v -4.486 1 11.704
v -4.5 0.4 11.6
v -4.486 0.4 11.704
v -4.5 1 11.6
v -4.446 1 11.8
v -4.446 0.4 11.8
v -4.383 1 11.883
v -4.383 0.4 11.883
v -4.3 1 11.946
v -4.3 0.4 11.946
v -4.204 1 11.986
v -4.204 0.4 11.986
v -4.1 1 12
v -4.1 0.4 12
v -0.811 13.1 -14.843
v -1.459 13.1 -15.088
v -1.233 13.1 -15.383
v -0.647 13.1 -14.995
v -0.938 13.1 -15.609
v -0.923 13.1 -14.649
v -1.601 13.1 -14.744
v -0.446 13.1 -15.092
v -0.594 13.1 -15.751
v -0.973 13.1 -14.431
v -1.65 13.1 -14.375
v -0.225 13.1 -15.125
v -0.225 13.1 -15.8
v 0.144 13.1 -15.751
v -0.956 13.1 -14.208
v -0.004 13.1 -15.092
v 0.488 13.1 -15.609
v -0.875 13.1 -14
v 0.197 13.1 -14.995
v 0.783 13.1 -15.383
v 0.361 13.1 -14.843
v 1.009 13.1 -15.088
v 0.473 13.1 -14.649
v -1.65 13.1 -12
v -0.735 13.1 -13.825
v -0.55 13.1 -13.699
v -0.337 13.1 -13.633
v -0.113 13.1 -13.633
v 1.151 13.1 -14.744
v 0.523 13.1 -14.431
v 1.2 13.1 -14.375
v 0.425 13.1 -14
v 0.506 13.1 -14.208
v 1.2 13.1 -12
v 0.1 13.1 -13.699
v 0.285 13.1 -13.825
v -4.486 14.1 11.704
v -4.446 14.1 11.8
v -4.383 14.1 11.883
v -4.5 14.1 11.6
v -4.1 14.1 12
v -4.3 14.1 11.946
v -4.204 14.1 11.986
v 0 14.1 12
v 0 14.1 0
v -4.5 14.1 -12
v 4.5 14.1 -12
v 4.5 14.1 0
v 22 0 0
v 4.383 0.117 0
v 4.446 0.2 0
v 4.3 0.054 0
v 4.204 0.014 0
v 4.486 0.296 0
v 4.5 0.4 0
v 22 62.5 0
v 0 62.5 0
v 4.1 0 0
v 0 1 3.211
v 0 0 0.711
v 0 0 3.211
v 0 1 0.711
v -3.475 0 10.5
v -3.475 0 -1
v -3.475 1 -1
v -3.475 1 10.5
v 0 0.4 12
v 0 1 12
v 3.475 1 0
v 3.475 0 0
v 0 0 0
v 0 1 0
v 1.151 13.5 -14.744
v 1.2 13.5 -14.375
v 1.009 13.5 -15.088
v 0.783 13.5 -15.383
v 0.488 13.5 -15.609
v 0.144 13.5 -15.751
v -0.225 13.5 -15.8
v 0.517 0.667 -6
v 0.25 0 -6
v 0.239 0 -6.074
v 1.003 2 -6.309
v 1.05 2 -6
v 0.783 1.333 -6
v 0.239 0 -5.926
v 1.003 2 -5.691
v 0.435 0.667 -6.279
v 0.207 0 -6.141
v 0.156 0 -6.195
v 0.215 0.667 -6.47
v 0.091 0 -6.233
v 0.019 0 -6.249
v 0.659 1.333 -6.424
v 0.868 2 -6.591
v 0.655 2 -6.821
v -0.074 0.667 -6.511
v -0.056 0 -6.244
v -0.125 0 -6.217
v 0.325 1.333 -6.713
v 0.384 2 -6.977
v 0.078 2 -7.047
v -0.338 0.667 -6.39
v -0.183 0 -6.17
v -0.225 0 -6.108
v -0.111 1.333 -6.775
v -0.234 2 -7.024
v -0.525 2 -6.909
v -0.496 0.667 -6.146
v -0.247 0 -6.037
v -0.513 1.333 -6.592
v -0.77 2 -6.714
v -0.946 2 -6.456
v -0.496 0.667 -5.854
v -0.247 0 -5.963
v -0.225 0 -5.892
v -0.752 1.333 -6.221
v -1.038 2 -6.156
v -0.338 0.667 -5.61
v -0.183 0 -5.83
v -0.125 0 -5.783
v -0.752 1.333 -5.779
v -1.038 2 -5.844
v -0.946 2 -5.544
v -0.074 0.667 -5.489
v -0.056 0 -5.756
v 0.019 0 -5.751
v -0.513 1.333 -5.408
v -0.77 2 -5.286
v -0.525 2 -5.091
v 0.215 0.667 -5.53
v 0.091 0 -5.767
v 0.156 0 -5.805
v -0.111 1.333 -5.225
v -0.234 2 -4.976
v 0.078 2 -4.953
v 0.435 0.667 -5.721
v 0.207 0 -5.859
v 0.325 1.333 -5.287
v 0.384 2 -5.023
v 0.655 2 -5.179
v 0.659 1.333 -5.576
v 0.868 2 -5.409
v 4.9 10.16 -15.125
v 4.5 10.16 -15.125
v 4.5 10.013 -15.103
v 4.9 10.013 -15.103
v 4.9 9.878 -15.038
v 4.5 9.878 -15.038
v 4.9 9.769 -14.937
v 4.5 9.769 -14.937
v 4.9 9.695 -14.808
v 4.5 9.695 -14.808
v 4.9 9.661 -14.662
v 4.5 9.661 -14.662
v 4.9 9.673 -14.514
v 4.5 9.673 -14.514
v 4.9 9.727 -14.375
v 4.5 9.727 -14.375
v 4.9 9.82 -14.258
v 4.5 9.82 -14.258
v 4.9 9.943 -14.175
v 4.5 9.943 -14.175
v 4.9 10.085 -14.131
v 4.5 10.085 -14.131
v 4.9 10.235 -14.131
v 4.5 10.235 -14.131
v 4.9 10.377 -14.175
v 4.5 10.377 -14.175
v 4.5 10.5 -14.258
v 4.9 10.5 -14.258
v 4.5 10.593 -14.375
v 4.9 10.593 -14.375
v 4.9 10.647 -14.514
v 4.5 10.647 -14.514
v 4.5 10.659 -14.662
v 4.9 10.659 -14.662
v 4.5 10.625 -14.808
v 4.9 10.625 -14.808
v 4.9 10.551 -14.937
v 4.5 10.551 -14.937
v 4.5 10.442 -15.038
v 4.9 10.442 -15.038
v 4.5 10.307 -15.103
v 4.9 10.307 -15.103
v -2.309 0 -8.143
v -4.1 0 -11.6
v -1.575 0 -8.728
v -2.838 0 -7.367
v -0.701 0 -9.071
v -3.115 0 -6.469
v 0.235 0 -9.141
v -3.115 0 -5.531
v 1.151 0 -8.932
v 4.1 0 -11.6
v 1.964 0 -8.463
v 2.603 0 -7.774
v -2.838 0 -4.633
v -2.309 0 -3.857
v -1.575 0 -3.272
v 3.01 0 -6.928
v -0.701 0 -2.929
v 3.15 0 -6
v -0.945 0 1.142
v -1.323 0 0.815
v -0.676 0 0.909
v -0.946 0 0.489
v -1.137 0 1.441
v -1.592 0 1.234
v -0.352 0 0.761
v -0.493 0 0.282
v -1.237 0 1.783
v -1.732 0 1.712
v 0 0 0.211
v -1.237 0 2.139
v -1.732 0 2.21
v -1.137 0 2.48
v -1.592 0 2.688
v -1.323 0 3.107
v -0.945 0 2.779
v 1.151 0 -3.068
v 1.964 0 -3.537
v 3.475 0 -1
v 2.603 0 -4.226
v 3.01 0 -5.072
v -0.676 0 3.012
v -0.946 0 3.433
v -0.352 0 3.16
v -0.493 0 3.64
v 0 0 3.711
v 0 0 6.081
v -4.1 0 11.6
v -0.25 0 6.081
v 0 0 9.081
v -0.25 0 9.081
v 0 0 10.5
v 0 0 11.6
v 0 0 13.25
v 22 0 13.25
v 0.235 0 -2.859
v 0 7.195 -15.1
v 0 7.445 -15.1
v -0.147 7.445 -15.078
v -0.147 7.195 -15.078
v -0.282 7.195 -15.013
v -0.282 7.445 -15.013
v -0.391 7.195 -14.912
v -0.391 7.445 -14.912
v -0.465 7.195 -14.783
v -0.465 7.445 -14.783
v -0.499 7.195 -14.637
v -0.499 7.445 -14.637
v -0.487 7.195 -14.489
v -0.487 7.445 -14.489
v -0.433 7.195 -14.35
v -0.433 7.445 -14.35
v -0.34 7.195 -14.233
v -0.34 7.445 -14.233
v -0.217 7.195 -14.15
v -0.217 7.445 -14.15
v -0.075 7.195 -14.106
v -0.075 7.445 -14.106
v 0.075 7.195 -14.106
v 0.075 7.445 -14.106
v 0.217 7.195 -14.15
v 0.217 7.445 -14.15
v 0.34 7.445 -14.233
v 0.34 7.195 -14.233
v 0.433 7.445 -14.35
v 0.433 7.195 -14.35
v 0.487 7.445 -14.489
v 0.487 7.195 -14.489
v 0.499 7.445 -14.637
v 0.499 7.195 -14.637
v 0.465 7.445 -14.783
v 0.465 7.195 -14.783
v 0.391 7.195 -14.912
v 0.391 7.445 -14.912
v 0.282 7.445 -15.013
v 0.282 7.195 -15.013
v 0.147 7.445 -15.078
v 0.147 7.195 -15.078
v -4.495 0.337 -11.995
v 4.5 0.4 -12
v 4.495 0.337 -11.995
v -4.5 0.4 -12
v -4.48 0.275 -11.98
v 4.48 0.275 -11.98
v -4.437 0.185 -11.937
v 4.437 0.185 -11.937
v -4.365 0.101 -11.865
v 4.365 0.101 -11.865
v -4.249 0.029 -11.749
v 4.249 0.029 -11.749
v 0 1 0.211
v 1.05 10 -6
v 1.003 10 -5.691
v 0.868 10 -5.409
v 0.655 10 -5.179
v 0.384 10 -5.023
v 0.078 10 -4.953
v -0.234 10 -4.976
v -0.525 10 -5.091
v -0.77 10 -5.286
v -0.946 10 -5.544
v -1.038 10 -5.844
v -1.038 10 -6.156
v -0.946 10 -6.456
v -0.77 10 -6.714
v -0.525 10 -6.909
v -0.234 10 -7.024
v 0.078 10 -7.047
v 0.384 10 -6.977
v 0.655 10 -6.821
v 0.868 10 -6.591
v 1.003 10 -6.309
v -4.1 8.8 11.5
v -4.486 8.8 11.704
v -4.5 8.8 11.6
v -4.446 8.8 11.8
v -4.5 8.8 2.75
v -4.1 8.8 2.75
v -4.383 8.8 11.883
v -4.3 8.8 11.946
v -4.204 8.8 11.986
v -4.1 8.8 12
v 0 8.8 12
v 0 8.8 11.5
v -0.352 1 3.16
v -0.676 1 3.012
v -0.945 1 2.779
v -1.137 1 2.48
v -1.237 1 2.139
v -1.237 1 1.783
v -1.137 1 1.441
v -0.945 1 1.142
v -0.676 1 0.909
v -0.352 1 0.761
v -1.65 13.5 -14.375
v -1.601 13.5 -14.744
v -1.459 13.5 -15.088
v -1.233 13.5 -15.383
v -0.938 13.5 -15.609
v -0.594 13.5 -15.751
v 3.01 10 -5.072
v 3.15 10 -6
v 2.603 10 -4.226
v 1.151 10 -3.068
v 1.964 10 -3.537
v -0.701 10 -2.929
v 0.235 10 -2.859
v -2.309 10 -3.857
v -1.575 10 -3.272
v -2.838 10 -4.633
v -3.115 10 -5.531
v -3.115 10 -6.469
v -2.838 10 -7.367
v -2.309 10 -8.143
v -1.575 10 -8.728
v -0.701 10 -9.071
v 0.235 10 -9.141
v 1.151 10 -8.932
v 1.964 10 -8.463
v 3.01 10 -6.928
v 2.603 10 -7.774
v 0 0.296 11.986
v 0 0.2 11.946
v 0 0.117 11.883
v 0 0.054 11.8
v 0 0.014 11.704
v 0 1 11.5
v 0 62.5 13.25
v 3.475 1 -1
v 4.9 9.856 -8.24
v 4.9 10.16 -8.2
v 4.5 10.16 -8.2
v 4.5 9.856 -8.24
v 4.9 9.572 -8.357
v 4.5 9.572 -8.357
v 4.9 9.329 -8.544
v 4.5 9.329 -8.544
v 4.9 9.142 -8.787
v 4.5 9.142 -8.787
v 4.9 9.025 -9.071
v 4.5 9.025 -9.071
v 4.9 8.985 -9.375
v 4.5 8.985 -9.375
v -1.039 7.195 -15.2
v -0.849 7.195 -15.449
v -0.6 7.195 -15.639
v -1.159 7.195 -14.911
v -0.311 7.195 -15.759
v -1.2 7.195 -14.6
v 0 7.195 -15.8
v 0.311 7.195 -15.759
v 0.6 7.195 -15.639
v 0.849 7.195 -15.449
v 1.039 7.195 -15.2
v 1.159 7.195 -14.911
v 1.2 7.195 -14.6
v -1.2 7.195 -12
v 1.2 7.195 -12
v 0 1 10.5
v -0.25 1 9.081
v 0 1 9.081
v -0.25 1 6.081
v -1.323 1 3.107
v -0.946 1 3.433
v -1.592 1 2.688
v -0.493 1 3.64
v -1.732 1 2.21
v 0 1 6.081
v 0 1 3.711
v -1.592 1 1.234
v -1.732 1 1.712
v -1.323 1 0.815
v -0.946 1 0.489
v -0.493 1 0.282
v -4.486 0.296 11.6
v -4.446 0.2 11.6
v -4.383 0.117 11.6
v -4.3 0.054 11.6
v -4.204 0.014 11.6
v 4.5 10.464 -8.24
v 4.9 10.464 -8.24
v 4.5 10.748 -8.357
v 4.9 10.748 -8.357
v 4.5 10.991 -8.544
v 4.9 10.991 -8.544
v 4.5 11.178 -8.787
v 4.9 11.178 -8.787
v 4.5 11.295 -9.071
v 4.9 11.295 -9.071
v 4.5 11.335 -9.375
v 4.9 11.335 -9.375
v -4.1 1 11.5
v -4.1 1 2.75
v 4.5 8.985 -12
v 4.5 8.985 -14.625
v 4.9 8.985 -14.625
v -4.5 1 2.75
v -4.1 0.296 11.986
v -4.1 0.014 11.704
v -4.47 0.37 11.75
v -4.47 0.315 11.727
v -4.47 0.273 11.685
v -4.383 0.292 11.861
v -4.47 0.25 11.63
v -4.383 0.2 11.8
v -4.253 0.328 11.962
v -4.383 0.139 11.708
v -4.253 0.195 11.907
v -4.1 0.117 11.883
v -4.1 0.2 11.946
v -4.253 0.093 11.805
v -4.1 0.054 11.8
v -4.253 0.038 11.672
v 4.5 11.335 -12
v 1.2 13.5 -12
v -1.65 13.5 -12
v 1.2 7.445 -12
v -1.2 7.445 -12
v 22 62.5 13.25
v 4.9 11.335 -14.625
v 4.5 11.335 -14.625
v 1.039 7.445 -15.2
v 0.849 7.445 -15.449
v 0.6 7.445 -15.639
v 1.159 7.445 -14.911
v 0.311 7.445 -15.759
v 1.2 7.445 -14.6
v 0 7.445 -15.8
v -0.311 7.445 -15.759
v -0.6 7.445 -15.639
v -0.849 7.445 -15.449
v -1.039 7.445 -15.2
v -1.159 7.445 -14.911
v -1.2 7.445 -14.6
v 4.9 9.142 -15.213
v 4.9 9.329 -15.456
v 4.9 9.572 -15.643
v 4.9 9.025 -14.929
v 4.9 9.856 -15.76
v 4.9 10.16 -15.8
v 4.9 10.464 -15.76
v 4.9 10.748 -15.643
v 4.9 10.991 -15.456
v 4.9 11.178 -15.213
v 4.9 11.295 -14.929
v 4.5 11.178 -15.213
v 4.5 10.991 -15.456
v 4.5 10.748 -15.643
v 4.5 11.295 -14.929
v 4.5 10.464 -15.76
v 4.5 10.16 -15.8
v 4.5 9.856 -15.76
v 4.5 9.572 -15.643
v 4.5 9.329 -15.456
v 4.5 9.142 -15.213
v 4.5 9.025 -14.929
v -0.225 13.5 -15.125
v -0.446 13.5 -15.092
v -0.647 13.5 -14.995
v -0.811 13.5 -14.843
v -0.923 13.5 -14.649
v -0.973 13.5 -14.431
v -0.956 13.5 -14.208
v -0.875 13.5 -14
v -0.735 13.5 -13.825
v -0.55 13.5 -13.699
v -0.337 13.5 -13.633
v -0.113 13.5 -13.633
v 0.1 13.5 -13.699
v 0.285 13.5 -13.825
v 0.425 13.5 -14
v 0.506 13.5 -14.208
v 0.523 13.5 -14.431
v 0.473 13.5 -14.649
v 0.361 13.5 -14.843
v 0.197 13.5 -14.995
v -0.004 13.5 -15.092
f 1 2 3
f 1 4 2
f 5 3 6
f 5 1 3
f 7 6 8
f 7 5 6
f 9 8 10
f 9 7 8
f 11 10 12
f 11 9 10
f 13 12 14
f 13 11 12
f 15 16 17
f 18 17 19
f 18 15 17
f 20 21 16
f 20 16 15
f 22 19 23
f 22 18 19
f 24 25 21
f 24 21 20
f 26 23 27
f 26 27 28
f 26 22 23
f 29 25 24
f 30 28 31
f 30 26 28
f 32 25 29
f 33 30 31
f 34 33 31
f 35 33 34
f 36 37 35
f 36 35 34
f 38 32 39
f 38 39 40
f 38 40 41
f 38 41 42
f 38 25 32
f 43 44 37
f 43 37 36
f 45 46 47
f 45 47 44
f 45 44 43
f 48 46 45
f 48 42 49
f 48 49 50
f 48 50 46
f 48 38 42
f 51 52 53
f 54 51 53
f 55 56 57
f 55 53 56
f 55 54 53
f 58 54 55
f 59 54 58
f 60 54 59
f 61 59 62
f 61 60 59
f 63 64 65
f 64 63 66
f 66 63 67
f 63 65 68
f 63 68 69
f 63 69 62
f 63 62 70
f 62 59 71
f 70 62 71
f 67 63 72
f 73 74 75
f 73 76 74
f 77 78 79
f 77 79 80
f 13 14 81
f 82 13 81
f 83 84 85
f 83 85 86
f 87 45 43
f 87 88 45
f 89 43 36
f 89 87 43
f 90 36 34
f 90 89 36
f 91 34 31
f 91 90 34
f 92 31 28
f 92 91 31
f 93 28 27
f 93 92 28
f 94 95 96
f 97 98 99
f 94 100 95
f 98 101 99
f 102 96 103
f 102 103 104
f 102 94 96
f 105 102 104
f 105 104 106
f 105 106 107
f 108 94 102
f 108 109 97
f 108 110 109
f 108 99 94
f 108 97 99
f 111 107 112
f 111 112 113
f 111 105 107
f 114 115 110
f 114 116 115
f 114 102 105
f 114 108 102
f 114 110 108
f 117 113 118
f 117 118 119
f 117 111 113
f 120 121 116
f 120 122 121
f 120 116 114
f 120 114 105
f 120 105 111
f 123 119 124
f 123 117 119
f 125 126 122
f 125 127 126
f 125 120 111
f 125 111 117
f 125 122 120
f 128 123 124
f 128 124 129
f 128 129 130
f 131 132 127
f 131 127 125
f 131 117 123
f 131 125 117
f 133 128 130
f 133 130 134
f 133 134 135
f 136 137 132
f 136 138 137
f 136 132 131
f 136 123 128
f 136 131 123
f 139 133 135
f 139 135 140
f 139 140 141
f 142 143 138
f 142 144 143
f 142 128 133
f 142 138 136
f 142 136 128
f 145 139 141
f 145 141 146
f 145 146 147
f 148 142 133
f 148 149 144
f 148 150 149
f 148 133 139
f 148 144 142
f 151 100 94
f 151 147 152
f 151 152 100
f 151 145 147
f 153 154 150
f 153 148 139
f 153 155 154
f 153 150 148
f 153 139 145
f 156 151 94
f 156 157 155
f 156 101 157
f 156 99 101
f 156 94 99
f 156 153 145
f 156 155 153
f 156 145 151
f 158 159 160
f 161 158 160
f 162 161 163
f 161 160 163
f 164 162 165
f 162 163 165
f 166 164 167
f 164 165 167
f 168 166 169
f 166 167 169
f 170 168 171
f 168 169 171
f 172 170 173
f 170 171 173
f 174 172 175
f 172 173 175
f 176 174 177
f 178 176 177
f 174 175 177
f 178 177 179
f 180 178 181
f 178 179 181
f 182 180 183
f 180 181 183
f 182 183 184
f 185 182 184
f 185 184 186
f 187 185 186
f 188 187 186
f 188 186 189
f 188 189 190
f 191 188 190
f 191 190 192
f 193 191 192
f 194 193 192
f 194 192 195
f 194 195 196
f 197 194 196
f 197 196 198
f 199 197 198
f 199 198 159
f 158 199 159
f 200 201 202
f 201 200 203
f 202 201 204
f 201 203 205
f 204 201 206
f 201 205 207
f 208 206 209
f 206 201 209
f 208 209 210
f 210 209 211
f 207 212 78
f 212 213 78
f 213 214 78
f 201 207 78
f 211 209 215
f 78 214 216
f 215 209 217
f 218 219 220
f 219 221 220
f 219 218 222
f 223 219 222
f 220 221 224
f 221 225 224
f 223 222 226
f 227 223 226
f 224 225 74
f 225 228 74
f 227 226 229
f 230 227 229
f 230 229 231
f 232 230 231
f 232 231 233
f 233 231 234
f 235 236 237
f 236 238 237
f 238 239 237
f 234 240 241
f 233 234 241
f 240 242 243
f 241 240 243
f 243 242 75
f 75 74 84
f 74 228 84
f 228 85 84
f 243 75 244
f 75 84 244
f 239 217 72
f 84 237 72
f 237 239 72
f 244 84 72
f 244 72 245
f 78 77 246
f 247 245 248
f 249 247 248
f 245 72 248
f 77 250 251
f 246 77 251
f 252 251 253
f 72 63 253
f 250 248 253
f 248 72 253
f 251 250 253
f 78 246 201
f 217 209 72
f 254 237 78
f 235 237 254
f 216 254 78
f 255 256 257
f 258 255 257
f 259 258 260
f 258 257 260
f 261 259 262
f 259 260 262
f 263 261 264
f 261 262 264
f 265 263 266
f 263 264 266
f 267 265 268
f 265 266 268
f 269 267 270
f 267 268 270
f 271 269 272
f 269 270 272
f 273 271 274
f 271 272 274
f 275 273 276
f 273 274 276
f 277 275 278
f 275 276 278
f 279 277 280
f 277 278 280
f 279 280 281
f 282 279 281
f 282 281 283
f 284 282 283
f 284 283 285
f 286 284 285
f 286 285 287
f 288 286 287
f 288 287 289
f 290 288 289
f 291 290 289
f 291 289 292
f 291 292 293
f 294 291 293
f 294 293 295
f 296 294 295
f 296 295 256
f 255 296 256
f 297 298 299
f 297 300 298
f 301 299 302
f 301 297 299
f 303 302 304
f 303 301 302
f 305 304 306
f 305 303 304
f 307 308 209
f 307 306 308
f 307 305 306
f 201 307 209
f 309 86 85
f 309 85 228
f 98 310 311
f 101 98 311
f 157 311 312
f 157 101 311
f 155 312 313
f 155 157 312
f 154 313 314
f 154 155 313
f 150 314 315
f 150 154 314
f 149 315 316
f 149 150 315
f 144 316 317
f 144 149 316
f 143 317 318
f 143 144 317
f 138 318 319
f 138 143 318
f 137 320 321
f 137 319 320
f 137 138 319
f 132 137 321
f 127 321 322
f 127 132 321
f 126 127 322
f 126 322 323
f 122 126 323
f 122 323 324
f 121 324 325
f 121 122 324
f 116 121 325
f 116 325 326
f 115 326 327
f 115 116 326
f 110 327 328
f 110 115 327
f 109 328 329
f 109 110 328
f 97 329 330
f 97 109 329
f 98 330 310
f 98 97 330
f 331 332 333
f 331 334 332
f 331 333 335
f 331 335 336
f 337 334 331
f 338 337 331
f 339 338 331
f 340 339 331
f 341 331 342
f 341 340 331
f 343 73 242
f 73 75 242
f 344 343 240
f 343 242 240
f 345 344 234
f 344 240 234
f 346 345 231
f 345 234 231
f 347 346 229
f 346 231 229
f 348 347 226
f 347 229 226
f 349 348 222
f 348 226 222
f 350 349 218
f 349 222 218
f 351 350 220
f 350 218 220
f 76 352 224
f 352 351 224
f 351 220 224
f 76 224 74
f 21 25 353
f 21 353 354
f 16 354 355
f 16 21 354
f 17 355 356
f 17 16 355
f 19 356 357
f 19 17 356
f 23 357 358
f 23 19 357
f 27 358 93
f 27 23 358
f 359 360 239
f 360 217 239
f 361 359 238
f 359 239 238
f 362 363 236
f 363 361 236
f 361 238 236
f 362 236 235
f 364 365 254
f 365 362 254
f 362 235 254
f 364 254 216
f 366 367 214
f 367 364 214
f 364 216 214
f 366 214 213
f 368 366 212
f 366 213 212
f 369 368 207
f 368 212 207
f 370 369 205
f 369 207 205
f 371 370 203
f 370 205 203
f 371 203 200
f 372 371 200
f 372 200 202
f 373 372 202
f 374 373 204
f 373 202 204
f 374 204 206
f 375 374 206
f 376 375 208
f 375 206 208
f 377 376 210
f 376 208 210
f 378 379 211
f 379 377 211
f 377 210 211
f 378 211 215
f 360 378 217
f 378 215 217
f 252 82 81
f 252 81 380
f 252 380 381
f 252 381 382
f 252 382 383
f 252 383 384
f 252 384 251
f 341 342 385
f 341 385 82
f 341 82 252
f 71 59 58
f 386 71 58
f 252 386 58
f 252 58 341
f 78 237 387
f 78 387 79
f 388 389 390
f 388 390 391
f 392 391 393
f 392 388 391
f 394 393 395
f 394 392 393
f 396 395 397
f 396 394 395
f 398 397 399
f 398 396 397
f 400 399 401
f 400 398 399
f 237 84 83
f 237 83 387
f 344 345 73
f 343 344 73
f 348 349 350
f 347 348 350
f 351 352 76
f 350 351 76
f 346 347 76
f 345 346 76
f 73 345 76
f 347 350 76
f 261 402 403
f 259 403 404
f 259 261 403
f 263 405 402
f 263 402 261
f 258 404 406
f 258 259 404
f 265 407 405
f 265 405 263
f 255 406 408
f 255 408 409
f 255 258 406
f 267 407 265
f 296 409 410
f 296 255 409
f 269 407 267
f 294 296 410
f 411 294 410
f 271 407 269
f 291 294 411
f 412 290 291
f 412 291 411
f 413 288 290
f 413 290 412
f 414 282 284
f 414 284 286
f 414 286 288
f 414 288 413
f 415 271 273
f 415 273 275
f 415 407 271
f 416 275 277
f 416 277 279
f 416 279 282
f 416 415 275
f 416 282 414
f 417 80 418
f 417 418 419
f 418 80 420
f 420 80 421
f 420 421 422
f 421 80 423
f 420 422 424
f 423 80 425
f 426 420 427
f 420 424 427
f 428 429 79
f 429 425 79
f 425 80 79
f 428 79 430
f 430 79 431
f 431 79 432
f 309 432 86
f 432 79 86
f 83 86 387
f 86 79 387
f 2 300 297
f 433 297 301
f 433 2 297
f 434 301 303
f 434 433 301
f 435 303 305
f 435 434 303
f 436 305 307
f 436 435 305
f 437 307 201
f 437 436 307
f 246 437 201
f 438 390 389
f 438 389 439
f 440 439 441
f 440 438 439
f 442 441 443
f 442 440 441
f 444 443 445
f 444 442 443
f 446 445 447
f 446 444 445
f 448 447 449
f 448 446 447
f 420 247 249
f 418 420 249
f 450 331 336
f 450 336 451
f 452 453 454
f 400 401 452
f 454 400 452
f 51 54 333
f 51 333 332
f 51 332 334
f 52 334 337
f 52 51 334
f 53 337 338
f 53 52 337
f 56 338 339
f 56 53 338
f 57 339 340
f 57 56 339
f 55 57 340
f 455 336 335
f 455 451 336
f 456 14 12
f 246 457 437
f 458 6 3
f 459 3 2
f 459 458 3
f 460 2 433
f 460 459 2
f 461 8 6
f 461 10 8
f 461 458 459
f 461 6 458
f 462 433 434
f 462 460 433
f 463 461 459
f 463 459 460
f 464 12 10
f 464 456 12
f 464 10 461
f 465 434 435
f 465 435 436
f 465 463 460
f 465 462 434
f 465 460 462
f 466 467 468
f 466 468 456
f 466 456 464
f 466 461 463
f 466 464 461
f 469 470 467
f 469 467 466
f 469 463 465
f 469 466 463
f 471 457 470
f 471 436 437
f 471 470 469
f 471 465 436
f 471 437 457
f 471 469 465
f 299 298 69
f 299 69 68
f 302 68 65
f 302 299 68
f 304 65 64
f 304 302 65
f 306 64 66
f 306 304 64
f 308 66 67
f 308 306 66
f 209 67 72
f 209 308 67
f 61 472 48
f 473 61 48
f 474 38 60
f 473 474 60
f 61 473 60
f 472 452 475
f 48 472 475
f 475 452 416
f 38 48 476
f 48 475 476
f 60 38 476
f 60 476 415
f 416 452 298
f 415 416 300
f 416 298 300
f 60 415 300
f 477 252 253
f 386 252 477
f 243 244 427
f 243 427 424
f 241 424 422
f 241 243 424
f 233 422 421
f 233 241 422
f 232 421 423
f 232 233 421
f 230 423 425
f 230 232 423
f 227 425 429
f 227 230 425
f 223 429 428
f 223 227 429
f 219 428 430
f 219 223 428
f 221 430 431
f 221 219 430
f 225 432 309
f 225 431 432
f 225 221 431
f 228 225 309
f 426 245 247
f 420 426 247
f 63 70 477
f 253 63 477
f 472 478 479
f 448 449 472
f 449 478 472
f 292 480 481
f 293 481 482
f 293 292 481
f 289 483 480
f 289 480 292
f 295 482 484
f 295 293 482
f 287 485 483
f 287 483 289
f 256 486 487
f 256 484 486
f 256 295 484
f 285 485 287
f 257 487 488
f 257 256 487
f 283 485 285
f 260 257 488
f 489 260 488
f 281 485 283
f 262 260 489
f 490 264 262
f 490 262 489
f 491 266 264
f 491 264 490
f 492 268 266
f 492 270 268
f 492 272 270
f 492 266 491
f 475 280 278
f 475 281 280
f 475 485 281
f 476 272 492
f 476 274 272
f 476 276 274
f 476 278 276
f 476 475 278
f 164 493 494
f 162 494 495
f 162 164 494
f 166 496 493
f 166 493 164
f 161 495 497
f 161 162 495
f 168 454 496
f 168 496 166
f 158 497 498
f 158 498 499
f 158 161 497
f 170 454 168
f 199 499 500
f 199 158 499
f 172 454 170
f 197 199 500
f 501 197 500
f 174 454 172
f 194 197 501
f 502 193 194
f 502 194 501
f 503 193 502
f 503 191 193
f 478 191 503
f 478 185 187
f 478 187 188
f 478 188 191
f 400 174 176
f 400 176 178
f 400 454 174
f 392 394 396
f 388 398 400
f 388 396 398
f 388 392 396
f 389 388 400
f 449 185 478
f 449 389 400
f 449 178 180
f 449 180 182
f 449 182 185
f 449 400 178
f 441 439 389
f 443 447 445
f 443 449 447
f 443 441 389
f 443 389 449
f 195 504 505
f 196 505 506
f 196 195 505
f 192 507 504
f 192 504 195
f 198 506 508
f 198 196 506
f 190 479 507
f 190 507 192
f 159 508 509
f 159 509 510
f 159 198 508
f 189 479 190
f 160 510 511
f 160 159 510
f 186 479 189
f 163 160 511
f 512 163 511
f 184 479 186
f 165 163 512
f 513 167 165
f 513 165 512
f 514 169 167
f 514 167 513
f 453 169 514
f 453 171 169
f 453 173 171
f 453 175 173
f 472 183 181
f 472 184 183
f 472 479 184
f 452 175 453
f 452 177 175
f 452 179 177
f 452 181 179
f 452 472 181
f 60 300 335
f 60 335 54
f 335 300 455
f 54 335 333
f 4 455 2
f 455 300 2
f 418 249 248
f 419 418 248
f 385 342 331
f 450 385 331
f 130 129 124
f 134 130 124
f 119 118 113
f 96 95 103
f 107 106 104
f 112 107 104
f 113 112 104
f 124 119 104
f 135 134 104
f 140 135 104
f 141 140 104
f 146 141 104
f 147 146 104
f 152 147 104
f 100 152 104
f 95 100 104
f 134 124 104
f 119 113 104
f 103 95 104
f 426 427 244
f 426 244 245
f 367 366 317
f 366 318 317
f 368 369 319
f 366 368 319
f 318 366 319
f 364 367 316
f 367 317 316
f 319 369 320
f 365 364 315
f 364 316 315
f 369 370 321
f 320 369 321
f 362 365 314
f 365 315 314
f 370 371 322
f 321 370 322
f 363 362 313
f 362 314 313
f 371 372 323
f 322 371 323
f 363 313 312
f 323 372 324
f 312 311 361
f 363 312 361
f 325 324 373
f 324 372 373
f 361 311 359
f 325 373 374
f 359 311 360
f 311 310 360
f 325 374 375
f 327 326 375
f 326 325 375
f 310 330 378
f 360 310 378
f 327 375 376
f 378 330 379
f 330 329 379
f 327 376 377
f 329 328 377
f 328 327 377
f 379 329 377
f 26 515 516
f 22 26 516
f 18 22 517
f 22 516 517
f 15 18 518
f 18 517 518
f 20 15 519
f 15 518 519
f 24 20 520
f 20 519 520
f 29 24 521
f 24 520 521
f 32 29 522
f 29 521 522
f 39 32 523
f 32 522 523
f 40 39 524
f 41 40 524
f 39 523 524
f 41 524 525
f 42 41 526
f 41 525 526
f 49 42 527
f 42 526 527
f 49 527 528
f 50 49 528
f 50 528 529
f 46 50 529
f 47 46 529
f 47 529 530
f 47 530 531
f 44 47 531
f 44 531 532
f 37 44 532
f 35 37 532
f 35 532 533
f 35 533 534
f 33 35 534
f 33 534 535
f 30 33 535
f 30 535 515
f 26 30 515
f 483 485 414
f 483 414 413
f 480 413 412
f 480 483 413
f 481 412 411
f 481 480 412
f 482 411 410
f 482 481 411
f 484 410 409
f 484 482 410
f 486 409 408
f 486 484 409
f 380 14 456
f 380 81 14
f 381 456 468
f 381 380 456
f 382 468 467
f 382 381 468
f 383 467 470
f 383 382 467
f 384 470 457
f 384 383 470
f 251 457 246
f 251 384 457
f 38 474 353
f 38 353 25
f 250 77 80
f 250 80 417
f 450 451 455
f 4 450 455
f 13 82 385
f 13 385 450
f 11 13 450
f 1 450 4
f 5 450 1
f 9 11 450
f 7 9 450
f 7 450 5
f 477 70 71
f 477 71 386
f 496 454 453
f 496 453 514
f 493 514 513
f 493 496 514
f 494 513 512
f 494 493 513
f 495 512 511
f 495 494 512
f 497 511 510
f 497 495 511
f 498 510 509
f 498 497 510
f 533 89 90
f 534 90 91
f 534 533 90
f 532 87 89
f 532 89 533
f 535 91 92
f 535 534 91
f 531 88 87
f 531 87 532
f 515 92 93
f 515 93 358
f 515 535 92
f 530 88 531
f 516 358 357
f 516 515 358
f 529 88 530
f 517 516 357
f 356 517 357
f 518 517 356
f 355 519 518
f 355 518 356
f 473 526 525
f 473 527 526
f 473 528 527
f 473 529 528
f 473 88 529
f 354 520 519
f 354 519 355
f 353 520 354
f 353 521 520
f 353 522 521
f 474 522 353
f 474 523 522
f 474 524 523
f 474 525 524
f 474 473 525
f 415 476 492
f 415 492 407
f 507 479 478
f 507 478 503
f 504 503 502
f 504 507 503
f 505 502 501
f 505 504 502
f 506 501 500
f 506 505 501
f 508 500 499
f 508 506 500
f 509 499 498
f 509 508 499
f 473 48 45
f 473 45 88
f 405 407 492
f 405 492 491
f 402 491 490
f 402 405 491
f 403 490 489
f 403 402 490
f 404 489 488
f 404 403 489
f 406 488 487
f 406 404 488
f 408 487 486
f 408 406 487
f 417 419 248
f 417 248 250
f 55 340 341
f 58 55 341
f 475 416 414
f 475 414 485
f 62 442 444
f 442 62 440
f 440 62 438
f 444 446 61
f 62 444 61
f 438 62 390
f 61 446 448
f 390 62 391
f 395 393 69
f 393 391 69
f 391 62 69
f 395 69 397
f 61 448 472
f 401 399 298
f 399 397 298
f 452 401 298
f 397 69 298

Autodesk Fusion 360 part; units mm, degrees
sketch "Front Face" plane through (0, 0, 0) normal (0, 1, 0) x (1, 0, 0)
  line L0 (4.5, 12) -> (-4.5, 12)
  line L1 (-4.5, 12) -> (-4.5, -12)
  line L2 (-4.5, -12) -> (4.5, -12)
  line L3 (4.5, -12) -> (4.5, 12)
  line L4 (4.5, 12) -> (-4.5, -12) construction
  line L5 (-4.5, 12) -> (4.5, -12) construction
  circle A0 centre (0, 6) radius 3.15
  line L6 (3.4751, 1) -> (-3.4751, 1)
  line L7 (-3.4751, 1) -> (-3.4751, -10.5)
  line L8 (-3.4751, -10.5) -> (3.4751, -10.5)
  line L9 (3.4751, -10.5) -> (3.4751, 1)
  line L10 (3.4751, 1) -> (-3.4751, -10.5) construction
  line L11 (-3.4751, 1) -> (3.4751, -10.5) construction
  circle A1 centre (0, 6) radius 1.05
  line L12 (0, -12) -> (0, 12) construction
  circle A2 centre (0, -1.9607) radius 1.75
  circle A3 centre (0, -1.9607) radius 1.25
  line L13 (0.25, -6.0814) -> (-0.25, -6.0814)
  line L14 (-0.25, -6.0814) -> (-0.25, -9.0814)
  line L15 (-0.25, -9.0814) -> (0.25, -9.0814)
  line L16 (0.25, -9.0814) -> (0.25, -6.0814)
  line L17 (0.25, -6.0814) -> (-0.25, -9.0814) construction
  line L18 (-0.25, -6.0814) -> (0.25, -9.0814) construction
  point P0 (0, -4.75)
  point P1 (0, -7.5814)
  dimension "d1" = 24
  dimension "d2" = 9
  dimension "d3" = 6.3
  dimension "d4" = 1.5
  dimension "d5" = 1
  dimension "d6" = 6
  dimension "d11" = 2.1
  dimension "d12" = 0.5
  dimension "d13" = 2.5
  dimension "d14" = 0.5
  dimension "d15" = 3
extrude "Extrude1" add sketch "Front Face" along normal blind 14.1 contours L0 L1 L2 L3 | A0 | L6 L7 L8 L9 | A1 | A2 | A3 | L13 L14 L15 L16
extrude "Extrude2" cut sketch "Front Face" along normal blind 10 contours A0
extrude "Extrude3" cut sketch "Front Face" along normal blind 1 contours L6 L7 L8 L9 | A3
chamfer "Chamfer1" distance 0.8 distance2 2 1 edges at (-0.9789, 0, -6.3797) measured on face at (0.3381, 0, -5.6969)
fillet "Fillet1" radius 0.4 6 edges at (4.5, 0, 0) (0, 0, 12) (-4.5, 0, 0) (0, 0, -12) (4.5, 7.05, 12) (-4.5, 7.05, 12)
sketch "Bottom Lugs" plane through (0, 0, -12) normal (0, 0, -1) x (1, 0, 0)
  line L0 (4.5, -0.4) -> (-4.5, -0.4)
  line L1 (-4.5, -0.4) -> (-4.5, -14.1)
  line L2 (-4.5, -14.1) -> (4.5, -14.1)
  line L3 (4.5, -14.1) -> (4.5, -0.4)
  line L4 (-1.2, -7.195) -> (1.2, -7.195)
  line L5 (1.2, -7.195) -> (1.2, -7.445)
  line L6 (1.2, -7.445) -> (-1.2, -7.445)
  line L7 (-1.2, -7.445) -> (-1.2, -7.195)
  line L8 (4.5, -8.985) -> (4.9, -8.985)
  line L9 (4.9, -8.985) -> (4.9, -11.335)
  line L10 (4.9, -11.335) -> (4.5, -11.335)
  line L11 (4.5, -11.335) -> (4.5, -8.985)
  line L12 (-1.65, -13.1) -> (1.2, -13.1)
  line L13 (1.2, -13.1) -> (1.2, -13.5)
  line L14 (1.2, -13.5) -> (-1.65, -13.5)
  line L15 (-1.65, -13.5) -> (-1.65, -13.1)
  line L16 (4.5, 0) -> (-4.5, 0)
  point P0 (0, -7.195)
  point P1 (1.2, -7.32)
  point P2 (1.2, -13.3)
  point P3 (4.7, -11.335)
  point P4 (4.9, -10.16)
  dimension "d21" = 0.25
  dimension "d22" = 2.4
  dimension "d23" = 0.4
  dimension "d24" = 2.35
  dimension "d25" = 2.85
  dimension "d26" = 0.4
  dimension "d28" = 7.32
  dimension "d29" = 13.3
  dimension "d30" = 4.7
  dimension "d33" = 10.16
extrude "Extrude4" add sketch "Bottom Lugs" along normal blind 3.8 contours L4 L5 L6 L7 | L12 L13 L14 L15
extrude "Extrude5" add sketch "Bottom Lugs" along normal mid plane 7.6 contours L3 L8 L9 L10 L11
fillet "Fillet2" radius 1.175 4 edges at (4.7, 8.985, -15.8) (4.7, 11.335, -15.8) (4.7, 8.985, -8.2) (4.7, 11.335, -8.2)
fillet "Fillet2" radius 1.425 2 edges at (1.2, 13.3, -15.8) (-1.65, 13.3, -15.8)
fillet "Fillet2" radius 1.2 2 edges at (1.2, 7.32, -15.8) (-1.2, 7.32, -15.8)
hole "Hole1" at (0, 7.195, -14.6) direction (0, 1, 0) diameter 1 depth 1 tip angle 180
hole "Hole2" at (-0.225, 13.1, -14.375) direction (0, 1, 0) diameter 1.5 depth 1.5 tip angle 180
hole "Hole3" at (4.9, 10.16, -14.625) direction (-1, 0, 0) diameter 1 depth 1 tip angle 180
sketch "Sketch3" plane through (0, 0, 12) normal (0, 0, 1) x (-1, 0, 0)
  line L0 (4.1, -14.1) -> (4.1, -0.4)
  line L1 (4.1, -0.4) -> (-4.1, -0.4)
  line L2 (-4.1, -0.4) -> (-4.1, -14.1)
  line L3 (-4.1, -14.1) -> (4.1, -14.1)
  line L4 (4.5, -0.4) -> (4.5, -14.1)
  line L5 (-4.5, -14.1) -> (-4.5, -0.4)
  line L6 (4.5, -8.8) -> (-4.5, -8.8)
  line L7 (-4.5, -8.8) -> (-4.5, -1)
  line L8 (-4.5, -1) -> (4.5, -1)
  line L9 (4.5, -1) -> (4.5, -8.8)
  line L10 (-4.5, 0) -> (4.5, 0)
  dimension "d48" = 1
  dimension "d49" = 8.8
extrude "Extrude6" cut sketch "Sketch3" against normal blind 0.5 contours L0 L2 L6 L8 | L0 L4 L6 L8 L9 | L2 L5 L6 L7 L8
extrude "Extrude7" cut sketch "Sketch3" against normal blind 9.25 contours L0 L4 L6 L8 L9 | L2 L5 L6 L7 L8
equation "d36 = ( 2.35 / 2 ) * 1 mm"
equation "d37 = ( 2.85 / 2 ) * 1 mm"
equation "d38 = ( 2.4 / 2 ) * 1 mm"
equation "d52 = -18.5 mm / 2"

Autodesk Fusion 360 part; units mm, degrees
box "BoxPrimitive1" add length 62.5 width 22 height 13.25 placed x (0, 1, 0) y (-1, 0, 0) z (0, 0, 1) at (22, 0, 0)
